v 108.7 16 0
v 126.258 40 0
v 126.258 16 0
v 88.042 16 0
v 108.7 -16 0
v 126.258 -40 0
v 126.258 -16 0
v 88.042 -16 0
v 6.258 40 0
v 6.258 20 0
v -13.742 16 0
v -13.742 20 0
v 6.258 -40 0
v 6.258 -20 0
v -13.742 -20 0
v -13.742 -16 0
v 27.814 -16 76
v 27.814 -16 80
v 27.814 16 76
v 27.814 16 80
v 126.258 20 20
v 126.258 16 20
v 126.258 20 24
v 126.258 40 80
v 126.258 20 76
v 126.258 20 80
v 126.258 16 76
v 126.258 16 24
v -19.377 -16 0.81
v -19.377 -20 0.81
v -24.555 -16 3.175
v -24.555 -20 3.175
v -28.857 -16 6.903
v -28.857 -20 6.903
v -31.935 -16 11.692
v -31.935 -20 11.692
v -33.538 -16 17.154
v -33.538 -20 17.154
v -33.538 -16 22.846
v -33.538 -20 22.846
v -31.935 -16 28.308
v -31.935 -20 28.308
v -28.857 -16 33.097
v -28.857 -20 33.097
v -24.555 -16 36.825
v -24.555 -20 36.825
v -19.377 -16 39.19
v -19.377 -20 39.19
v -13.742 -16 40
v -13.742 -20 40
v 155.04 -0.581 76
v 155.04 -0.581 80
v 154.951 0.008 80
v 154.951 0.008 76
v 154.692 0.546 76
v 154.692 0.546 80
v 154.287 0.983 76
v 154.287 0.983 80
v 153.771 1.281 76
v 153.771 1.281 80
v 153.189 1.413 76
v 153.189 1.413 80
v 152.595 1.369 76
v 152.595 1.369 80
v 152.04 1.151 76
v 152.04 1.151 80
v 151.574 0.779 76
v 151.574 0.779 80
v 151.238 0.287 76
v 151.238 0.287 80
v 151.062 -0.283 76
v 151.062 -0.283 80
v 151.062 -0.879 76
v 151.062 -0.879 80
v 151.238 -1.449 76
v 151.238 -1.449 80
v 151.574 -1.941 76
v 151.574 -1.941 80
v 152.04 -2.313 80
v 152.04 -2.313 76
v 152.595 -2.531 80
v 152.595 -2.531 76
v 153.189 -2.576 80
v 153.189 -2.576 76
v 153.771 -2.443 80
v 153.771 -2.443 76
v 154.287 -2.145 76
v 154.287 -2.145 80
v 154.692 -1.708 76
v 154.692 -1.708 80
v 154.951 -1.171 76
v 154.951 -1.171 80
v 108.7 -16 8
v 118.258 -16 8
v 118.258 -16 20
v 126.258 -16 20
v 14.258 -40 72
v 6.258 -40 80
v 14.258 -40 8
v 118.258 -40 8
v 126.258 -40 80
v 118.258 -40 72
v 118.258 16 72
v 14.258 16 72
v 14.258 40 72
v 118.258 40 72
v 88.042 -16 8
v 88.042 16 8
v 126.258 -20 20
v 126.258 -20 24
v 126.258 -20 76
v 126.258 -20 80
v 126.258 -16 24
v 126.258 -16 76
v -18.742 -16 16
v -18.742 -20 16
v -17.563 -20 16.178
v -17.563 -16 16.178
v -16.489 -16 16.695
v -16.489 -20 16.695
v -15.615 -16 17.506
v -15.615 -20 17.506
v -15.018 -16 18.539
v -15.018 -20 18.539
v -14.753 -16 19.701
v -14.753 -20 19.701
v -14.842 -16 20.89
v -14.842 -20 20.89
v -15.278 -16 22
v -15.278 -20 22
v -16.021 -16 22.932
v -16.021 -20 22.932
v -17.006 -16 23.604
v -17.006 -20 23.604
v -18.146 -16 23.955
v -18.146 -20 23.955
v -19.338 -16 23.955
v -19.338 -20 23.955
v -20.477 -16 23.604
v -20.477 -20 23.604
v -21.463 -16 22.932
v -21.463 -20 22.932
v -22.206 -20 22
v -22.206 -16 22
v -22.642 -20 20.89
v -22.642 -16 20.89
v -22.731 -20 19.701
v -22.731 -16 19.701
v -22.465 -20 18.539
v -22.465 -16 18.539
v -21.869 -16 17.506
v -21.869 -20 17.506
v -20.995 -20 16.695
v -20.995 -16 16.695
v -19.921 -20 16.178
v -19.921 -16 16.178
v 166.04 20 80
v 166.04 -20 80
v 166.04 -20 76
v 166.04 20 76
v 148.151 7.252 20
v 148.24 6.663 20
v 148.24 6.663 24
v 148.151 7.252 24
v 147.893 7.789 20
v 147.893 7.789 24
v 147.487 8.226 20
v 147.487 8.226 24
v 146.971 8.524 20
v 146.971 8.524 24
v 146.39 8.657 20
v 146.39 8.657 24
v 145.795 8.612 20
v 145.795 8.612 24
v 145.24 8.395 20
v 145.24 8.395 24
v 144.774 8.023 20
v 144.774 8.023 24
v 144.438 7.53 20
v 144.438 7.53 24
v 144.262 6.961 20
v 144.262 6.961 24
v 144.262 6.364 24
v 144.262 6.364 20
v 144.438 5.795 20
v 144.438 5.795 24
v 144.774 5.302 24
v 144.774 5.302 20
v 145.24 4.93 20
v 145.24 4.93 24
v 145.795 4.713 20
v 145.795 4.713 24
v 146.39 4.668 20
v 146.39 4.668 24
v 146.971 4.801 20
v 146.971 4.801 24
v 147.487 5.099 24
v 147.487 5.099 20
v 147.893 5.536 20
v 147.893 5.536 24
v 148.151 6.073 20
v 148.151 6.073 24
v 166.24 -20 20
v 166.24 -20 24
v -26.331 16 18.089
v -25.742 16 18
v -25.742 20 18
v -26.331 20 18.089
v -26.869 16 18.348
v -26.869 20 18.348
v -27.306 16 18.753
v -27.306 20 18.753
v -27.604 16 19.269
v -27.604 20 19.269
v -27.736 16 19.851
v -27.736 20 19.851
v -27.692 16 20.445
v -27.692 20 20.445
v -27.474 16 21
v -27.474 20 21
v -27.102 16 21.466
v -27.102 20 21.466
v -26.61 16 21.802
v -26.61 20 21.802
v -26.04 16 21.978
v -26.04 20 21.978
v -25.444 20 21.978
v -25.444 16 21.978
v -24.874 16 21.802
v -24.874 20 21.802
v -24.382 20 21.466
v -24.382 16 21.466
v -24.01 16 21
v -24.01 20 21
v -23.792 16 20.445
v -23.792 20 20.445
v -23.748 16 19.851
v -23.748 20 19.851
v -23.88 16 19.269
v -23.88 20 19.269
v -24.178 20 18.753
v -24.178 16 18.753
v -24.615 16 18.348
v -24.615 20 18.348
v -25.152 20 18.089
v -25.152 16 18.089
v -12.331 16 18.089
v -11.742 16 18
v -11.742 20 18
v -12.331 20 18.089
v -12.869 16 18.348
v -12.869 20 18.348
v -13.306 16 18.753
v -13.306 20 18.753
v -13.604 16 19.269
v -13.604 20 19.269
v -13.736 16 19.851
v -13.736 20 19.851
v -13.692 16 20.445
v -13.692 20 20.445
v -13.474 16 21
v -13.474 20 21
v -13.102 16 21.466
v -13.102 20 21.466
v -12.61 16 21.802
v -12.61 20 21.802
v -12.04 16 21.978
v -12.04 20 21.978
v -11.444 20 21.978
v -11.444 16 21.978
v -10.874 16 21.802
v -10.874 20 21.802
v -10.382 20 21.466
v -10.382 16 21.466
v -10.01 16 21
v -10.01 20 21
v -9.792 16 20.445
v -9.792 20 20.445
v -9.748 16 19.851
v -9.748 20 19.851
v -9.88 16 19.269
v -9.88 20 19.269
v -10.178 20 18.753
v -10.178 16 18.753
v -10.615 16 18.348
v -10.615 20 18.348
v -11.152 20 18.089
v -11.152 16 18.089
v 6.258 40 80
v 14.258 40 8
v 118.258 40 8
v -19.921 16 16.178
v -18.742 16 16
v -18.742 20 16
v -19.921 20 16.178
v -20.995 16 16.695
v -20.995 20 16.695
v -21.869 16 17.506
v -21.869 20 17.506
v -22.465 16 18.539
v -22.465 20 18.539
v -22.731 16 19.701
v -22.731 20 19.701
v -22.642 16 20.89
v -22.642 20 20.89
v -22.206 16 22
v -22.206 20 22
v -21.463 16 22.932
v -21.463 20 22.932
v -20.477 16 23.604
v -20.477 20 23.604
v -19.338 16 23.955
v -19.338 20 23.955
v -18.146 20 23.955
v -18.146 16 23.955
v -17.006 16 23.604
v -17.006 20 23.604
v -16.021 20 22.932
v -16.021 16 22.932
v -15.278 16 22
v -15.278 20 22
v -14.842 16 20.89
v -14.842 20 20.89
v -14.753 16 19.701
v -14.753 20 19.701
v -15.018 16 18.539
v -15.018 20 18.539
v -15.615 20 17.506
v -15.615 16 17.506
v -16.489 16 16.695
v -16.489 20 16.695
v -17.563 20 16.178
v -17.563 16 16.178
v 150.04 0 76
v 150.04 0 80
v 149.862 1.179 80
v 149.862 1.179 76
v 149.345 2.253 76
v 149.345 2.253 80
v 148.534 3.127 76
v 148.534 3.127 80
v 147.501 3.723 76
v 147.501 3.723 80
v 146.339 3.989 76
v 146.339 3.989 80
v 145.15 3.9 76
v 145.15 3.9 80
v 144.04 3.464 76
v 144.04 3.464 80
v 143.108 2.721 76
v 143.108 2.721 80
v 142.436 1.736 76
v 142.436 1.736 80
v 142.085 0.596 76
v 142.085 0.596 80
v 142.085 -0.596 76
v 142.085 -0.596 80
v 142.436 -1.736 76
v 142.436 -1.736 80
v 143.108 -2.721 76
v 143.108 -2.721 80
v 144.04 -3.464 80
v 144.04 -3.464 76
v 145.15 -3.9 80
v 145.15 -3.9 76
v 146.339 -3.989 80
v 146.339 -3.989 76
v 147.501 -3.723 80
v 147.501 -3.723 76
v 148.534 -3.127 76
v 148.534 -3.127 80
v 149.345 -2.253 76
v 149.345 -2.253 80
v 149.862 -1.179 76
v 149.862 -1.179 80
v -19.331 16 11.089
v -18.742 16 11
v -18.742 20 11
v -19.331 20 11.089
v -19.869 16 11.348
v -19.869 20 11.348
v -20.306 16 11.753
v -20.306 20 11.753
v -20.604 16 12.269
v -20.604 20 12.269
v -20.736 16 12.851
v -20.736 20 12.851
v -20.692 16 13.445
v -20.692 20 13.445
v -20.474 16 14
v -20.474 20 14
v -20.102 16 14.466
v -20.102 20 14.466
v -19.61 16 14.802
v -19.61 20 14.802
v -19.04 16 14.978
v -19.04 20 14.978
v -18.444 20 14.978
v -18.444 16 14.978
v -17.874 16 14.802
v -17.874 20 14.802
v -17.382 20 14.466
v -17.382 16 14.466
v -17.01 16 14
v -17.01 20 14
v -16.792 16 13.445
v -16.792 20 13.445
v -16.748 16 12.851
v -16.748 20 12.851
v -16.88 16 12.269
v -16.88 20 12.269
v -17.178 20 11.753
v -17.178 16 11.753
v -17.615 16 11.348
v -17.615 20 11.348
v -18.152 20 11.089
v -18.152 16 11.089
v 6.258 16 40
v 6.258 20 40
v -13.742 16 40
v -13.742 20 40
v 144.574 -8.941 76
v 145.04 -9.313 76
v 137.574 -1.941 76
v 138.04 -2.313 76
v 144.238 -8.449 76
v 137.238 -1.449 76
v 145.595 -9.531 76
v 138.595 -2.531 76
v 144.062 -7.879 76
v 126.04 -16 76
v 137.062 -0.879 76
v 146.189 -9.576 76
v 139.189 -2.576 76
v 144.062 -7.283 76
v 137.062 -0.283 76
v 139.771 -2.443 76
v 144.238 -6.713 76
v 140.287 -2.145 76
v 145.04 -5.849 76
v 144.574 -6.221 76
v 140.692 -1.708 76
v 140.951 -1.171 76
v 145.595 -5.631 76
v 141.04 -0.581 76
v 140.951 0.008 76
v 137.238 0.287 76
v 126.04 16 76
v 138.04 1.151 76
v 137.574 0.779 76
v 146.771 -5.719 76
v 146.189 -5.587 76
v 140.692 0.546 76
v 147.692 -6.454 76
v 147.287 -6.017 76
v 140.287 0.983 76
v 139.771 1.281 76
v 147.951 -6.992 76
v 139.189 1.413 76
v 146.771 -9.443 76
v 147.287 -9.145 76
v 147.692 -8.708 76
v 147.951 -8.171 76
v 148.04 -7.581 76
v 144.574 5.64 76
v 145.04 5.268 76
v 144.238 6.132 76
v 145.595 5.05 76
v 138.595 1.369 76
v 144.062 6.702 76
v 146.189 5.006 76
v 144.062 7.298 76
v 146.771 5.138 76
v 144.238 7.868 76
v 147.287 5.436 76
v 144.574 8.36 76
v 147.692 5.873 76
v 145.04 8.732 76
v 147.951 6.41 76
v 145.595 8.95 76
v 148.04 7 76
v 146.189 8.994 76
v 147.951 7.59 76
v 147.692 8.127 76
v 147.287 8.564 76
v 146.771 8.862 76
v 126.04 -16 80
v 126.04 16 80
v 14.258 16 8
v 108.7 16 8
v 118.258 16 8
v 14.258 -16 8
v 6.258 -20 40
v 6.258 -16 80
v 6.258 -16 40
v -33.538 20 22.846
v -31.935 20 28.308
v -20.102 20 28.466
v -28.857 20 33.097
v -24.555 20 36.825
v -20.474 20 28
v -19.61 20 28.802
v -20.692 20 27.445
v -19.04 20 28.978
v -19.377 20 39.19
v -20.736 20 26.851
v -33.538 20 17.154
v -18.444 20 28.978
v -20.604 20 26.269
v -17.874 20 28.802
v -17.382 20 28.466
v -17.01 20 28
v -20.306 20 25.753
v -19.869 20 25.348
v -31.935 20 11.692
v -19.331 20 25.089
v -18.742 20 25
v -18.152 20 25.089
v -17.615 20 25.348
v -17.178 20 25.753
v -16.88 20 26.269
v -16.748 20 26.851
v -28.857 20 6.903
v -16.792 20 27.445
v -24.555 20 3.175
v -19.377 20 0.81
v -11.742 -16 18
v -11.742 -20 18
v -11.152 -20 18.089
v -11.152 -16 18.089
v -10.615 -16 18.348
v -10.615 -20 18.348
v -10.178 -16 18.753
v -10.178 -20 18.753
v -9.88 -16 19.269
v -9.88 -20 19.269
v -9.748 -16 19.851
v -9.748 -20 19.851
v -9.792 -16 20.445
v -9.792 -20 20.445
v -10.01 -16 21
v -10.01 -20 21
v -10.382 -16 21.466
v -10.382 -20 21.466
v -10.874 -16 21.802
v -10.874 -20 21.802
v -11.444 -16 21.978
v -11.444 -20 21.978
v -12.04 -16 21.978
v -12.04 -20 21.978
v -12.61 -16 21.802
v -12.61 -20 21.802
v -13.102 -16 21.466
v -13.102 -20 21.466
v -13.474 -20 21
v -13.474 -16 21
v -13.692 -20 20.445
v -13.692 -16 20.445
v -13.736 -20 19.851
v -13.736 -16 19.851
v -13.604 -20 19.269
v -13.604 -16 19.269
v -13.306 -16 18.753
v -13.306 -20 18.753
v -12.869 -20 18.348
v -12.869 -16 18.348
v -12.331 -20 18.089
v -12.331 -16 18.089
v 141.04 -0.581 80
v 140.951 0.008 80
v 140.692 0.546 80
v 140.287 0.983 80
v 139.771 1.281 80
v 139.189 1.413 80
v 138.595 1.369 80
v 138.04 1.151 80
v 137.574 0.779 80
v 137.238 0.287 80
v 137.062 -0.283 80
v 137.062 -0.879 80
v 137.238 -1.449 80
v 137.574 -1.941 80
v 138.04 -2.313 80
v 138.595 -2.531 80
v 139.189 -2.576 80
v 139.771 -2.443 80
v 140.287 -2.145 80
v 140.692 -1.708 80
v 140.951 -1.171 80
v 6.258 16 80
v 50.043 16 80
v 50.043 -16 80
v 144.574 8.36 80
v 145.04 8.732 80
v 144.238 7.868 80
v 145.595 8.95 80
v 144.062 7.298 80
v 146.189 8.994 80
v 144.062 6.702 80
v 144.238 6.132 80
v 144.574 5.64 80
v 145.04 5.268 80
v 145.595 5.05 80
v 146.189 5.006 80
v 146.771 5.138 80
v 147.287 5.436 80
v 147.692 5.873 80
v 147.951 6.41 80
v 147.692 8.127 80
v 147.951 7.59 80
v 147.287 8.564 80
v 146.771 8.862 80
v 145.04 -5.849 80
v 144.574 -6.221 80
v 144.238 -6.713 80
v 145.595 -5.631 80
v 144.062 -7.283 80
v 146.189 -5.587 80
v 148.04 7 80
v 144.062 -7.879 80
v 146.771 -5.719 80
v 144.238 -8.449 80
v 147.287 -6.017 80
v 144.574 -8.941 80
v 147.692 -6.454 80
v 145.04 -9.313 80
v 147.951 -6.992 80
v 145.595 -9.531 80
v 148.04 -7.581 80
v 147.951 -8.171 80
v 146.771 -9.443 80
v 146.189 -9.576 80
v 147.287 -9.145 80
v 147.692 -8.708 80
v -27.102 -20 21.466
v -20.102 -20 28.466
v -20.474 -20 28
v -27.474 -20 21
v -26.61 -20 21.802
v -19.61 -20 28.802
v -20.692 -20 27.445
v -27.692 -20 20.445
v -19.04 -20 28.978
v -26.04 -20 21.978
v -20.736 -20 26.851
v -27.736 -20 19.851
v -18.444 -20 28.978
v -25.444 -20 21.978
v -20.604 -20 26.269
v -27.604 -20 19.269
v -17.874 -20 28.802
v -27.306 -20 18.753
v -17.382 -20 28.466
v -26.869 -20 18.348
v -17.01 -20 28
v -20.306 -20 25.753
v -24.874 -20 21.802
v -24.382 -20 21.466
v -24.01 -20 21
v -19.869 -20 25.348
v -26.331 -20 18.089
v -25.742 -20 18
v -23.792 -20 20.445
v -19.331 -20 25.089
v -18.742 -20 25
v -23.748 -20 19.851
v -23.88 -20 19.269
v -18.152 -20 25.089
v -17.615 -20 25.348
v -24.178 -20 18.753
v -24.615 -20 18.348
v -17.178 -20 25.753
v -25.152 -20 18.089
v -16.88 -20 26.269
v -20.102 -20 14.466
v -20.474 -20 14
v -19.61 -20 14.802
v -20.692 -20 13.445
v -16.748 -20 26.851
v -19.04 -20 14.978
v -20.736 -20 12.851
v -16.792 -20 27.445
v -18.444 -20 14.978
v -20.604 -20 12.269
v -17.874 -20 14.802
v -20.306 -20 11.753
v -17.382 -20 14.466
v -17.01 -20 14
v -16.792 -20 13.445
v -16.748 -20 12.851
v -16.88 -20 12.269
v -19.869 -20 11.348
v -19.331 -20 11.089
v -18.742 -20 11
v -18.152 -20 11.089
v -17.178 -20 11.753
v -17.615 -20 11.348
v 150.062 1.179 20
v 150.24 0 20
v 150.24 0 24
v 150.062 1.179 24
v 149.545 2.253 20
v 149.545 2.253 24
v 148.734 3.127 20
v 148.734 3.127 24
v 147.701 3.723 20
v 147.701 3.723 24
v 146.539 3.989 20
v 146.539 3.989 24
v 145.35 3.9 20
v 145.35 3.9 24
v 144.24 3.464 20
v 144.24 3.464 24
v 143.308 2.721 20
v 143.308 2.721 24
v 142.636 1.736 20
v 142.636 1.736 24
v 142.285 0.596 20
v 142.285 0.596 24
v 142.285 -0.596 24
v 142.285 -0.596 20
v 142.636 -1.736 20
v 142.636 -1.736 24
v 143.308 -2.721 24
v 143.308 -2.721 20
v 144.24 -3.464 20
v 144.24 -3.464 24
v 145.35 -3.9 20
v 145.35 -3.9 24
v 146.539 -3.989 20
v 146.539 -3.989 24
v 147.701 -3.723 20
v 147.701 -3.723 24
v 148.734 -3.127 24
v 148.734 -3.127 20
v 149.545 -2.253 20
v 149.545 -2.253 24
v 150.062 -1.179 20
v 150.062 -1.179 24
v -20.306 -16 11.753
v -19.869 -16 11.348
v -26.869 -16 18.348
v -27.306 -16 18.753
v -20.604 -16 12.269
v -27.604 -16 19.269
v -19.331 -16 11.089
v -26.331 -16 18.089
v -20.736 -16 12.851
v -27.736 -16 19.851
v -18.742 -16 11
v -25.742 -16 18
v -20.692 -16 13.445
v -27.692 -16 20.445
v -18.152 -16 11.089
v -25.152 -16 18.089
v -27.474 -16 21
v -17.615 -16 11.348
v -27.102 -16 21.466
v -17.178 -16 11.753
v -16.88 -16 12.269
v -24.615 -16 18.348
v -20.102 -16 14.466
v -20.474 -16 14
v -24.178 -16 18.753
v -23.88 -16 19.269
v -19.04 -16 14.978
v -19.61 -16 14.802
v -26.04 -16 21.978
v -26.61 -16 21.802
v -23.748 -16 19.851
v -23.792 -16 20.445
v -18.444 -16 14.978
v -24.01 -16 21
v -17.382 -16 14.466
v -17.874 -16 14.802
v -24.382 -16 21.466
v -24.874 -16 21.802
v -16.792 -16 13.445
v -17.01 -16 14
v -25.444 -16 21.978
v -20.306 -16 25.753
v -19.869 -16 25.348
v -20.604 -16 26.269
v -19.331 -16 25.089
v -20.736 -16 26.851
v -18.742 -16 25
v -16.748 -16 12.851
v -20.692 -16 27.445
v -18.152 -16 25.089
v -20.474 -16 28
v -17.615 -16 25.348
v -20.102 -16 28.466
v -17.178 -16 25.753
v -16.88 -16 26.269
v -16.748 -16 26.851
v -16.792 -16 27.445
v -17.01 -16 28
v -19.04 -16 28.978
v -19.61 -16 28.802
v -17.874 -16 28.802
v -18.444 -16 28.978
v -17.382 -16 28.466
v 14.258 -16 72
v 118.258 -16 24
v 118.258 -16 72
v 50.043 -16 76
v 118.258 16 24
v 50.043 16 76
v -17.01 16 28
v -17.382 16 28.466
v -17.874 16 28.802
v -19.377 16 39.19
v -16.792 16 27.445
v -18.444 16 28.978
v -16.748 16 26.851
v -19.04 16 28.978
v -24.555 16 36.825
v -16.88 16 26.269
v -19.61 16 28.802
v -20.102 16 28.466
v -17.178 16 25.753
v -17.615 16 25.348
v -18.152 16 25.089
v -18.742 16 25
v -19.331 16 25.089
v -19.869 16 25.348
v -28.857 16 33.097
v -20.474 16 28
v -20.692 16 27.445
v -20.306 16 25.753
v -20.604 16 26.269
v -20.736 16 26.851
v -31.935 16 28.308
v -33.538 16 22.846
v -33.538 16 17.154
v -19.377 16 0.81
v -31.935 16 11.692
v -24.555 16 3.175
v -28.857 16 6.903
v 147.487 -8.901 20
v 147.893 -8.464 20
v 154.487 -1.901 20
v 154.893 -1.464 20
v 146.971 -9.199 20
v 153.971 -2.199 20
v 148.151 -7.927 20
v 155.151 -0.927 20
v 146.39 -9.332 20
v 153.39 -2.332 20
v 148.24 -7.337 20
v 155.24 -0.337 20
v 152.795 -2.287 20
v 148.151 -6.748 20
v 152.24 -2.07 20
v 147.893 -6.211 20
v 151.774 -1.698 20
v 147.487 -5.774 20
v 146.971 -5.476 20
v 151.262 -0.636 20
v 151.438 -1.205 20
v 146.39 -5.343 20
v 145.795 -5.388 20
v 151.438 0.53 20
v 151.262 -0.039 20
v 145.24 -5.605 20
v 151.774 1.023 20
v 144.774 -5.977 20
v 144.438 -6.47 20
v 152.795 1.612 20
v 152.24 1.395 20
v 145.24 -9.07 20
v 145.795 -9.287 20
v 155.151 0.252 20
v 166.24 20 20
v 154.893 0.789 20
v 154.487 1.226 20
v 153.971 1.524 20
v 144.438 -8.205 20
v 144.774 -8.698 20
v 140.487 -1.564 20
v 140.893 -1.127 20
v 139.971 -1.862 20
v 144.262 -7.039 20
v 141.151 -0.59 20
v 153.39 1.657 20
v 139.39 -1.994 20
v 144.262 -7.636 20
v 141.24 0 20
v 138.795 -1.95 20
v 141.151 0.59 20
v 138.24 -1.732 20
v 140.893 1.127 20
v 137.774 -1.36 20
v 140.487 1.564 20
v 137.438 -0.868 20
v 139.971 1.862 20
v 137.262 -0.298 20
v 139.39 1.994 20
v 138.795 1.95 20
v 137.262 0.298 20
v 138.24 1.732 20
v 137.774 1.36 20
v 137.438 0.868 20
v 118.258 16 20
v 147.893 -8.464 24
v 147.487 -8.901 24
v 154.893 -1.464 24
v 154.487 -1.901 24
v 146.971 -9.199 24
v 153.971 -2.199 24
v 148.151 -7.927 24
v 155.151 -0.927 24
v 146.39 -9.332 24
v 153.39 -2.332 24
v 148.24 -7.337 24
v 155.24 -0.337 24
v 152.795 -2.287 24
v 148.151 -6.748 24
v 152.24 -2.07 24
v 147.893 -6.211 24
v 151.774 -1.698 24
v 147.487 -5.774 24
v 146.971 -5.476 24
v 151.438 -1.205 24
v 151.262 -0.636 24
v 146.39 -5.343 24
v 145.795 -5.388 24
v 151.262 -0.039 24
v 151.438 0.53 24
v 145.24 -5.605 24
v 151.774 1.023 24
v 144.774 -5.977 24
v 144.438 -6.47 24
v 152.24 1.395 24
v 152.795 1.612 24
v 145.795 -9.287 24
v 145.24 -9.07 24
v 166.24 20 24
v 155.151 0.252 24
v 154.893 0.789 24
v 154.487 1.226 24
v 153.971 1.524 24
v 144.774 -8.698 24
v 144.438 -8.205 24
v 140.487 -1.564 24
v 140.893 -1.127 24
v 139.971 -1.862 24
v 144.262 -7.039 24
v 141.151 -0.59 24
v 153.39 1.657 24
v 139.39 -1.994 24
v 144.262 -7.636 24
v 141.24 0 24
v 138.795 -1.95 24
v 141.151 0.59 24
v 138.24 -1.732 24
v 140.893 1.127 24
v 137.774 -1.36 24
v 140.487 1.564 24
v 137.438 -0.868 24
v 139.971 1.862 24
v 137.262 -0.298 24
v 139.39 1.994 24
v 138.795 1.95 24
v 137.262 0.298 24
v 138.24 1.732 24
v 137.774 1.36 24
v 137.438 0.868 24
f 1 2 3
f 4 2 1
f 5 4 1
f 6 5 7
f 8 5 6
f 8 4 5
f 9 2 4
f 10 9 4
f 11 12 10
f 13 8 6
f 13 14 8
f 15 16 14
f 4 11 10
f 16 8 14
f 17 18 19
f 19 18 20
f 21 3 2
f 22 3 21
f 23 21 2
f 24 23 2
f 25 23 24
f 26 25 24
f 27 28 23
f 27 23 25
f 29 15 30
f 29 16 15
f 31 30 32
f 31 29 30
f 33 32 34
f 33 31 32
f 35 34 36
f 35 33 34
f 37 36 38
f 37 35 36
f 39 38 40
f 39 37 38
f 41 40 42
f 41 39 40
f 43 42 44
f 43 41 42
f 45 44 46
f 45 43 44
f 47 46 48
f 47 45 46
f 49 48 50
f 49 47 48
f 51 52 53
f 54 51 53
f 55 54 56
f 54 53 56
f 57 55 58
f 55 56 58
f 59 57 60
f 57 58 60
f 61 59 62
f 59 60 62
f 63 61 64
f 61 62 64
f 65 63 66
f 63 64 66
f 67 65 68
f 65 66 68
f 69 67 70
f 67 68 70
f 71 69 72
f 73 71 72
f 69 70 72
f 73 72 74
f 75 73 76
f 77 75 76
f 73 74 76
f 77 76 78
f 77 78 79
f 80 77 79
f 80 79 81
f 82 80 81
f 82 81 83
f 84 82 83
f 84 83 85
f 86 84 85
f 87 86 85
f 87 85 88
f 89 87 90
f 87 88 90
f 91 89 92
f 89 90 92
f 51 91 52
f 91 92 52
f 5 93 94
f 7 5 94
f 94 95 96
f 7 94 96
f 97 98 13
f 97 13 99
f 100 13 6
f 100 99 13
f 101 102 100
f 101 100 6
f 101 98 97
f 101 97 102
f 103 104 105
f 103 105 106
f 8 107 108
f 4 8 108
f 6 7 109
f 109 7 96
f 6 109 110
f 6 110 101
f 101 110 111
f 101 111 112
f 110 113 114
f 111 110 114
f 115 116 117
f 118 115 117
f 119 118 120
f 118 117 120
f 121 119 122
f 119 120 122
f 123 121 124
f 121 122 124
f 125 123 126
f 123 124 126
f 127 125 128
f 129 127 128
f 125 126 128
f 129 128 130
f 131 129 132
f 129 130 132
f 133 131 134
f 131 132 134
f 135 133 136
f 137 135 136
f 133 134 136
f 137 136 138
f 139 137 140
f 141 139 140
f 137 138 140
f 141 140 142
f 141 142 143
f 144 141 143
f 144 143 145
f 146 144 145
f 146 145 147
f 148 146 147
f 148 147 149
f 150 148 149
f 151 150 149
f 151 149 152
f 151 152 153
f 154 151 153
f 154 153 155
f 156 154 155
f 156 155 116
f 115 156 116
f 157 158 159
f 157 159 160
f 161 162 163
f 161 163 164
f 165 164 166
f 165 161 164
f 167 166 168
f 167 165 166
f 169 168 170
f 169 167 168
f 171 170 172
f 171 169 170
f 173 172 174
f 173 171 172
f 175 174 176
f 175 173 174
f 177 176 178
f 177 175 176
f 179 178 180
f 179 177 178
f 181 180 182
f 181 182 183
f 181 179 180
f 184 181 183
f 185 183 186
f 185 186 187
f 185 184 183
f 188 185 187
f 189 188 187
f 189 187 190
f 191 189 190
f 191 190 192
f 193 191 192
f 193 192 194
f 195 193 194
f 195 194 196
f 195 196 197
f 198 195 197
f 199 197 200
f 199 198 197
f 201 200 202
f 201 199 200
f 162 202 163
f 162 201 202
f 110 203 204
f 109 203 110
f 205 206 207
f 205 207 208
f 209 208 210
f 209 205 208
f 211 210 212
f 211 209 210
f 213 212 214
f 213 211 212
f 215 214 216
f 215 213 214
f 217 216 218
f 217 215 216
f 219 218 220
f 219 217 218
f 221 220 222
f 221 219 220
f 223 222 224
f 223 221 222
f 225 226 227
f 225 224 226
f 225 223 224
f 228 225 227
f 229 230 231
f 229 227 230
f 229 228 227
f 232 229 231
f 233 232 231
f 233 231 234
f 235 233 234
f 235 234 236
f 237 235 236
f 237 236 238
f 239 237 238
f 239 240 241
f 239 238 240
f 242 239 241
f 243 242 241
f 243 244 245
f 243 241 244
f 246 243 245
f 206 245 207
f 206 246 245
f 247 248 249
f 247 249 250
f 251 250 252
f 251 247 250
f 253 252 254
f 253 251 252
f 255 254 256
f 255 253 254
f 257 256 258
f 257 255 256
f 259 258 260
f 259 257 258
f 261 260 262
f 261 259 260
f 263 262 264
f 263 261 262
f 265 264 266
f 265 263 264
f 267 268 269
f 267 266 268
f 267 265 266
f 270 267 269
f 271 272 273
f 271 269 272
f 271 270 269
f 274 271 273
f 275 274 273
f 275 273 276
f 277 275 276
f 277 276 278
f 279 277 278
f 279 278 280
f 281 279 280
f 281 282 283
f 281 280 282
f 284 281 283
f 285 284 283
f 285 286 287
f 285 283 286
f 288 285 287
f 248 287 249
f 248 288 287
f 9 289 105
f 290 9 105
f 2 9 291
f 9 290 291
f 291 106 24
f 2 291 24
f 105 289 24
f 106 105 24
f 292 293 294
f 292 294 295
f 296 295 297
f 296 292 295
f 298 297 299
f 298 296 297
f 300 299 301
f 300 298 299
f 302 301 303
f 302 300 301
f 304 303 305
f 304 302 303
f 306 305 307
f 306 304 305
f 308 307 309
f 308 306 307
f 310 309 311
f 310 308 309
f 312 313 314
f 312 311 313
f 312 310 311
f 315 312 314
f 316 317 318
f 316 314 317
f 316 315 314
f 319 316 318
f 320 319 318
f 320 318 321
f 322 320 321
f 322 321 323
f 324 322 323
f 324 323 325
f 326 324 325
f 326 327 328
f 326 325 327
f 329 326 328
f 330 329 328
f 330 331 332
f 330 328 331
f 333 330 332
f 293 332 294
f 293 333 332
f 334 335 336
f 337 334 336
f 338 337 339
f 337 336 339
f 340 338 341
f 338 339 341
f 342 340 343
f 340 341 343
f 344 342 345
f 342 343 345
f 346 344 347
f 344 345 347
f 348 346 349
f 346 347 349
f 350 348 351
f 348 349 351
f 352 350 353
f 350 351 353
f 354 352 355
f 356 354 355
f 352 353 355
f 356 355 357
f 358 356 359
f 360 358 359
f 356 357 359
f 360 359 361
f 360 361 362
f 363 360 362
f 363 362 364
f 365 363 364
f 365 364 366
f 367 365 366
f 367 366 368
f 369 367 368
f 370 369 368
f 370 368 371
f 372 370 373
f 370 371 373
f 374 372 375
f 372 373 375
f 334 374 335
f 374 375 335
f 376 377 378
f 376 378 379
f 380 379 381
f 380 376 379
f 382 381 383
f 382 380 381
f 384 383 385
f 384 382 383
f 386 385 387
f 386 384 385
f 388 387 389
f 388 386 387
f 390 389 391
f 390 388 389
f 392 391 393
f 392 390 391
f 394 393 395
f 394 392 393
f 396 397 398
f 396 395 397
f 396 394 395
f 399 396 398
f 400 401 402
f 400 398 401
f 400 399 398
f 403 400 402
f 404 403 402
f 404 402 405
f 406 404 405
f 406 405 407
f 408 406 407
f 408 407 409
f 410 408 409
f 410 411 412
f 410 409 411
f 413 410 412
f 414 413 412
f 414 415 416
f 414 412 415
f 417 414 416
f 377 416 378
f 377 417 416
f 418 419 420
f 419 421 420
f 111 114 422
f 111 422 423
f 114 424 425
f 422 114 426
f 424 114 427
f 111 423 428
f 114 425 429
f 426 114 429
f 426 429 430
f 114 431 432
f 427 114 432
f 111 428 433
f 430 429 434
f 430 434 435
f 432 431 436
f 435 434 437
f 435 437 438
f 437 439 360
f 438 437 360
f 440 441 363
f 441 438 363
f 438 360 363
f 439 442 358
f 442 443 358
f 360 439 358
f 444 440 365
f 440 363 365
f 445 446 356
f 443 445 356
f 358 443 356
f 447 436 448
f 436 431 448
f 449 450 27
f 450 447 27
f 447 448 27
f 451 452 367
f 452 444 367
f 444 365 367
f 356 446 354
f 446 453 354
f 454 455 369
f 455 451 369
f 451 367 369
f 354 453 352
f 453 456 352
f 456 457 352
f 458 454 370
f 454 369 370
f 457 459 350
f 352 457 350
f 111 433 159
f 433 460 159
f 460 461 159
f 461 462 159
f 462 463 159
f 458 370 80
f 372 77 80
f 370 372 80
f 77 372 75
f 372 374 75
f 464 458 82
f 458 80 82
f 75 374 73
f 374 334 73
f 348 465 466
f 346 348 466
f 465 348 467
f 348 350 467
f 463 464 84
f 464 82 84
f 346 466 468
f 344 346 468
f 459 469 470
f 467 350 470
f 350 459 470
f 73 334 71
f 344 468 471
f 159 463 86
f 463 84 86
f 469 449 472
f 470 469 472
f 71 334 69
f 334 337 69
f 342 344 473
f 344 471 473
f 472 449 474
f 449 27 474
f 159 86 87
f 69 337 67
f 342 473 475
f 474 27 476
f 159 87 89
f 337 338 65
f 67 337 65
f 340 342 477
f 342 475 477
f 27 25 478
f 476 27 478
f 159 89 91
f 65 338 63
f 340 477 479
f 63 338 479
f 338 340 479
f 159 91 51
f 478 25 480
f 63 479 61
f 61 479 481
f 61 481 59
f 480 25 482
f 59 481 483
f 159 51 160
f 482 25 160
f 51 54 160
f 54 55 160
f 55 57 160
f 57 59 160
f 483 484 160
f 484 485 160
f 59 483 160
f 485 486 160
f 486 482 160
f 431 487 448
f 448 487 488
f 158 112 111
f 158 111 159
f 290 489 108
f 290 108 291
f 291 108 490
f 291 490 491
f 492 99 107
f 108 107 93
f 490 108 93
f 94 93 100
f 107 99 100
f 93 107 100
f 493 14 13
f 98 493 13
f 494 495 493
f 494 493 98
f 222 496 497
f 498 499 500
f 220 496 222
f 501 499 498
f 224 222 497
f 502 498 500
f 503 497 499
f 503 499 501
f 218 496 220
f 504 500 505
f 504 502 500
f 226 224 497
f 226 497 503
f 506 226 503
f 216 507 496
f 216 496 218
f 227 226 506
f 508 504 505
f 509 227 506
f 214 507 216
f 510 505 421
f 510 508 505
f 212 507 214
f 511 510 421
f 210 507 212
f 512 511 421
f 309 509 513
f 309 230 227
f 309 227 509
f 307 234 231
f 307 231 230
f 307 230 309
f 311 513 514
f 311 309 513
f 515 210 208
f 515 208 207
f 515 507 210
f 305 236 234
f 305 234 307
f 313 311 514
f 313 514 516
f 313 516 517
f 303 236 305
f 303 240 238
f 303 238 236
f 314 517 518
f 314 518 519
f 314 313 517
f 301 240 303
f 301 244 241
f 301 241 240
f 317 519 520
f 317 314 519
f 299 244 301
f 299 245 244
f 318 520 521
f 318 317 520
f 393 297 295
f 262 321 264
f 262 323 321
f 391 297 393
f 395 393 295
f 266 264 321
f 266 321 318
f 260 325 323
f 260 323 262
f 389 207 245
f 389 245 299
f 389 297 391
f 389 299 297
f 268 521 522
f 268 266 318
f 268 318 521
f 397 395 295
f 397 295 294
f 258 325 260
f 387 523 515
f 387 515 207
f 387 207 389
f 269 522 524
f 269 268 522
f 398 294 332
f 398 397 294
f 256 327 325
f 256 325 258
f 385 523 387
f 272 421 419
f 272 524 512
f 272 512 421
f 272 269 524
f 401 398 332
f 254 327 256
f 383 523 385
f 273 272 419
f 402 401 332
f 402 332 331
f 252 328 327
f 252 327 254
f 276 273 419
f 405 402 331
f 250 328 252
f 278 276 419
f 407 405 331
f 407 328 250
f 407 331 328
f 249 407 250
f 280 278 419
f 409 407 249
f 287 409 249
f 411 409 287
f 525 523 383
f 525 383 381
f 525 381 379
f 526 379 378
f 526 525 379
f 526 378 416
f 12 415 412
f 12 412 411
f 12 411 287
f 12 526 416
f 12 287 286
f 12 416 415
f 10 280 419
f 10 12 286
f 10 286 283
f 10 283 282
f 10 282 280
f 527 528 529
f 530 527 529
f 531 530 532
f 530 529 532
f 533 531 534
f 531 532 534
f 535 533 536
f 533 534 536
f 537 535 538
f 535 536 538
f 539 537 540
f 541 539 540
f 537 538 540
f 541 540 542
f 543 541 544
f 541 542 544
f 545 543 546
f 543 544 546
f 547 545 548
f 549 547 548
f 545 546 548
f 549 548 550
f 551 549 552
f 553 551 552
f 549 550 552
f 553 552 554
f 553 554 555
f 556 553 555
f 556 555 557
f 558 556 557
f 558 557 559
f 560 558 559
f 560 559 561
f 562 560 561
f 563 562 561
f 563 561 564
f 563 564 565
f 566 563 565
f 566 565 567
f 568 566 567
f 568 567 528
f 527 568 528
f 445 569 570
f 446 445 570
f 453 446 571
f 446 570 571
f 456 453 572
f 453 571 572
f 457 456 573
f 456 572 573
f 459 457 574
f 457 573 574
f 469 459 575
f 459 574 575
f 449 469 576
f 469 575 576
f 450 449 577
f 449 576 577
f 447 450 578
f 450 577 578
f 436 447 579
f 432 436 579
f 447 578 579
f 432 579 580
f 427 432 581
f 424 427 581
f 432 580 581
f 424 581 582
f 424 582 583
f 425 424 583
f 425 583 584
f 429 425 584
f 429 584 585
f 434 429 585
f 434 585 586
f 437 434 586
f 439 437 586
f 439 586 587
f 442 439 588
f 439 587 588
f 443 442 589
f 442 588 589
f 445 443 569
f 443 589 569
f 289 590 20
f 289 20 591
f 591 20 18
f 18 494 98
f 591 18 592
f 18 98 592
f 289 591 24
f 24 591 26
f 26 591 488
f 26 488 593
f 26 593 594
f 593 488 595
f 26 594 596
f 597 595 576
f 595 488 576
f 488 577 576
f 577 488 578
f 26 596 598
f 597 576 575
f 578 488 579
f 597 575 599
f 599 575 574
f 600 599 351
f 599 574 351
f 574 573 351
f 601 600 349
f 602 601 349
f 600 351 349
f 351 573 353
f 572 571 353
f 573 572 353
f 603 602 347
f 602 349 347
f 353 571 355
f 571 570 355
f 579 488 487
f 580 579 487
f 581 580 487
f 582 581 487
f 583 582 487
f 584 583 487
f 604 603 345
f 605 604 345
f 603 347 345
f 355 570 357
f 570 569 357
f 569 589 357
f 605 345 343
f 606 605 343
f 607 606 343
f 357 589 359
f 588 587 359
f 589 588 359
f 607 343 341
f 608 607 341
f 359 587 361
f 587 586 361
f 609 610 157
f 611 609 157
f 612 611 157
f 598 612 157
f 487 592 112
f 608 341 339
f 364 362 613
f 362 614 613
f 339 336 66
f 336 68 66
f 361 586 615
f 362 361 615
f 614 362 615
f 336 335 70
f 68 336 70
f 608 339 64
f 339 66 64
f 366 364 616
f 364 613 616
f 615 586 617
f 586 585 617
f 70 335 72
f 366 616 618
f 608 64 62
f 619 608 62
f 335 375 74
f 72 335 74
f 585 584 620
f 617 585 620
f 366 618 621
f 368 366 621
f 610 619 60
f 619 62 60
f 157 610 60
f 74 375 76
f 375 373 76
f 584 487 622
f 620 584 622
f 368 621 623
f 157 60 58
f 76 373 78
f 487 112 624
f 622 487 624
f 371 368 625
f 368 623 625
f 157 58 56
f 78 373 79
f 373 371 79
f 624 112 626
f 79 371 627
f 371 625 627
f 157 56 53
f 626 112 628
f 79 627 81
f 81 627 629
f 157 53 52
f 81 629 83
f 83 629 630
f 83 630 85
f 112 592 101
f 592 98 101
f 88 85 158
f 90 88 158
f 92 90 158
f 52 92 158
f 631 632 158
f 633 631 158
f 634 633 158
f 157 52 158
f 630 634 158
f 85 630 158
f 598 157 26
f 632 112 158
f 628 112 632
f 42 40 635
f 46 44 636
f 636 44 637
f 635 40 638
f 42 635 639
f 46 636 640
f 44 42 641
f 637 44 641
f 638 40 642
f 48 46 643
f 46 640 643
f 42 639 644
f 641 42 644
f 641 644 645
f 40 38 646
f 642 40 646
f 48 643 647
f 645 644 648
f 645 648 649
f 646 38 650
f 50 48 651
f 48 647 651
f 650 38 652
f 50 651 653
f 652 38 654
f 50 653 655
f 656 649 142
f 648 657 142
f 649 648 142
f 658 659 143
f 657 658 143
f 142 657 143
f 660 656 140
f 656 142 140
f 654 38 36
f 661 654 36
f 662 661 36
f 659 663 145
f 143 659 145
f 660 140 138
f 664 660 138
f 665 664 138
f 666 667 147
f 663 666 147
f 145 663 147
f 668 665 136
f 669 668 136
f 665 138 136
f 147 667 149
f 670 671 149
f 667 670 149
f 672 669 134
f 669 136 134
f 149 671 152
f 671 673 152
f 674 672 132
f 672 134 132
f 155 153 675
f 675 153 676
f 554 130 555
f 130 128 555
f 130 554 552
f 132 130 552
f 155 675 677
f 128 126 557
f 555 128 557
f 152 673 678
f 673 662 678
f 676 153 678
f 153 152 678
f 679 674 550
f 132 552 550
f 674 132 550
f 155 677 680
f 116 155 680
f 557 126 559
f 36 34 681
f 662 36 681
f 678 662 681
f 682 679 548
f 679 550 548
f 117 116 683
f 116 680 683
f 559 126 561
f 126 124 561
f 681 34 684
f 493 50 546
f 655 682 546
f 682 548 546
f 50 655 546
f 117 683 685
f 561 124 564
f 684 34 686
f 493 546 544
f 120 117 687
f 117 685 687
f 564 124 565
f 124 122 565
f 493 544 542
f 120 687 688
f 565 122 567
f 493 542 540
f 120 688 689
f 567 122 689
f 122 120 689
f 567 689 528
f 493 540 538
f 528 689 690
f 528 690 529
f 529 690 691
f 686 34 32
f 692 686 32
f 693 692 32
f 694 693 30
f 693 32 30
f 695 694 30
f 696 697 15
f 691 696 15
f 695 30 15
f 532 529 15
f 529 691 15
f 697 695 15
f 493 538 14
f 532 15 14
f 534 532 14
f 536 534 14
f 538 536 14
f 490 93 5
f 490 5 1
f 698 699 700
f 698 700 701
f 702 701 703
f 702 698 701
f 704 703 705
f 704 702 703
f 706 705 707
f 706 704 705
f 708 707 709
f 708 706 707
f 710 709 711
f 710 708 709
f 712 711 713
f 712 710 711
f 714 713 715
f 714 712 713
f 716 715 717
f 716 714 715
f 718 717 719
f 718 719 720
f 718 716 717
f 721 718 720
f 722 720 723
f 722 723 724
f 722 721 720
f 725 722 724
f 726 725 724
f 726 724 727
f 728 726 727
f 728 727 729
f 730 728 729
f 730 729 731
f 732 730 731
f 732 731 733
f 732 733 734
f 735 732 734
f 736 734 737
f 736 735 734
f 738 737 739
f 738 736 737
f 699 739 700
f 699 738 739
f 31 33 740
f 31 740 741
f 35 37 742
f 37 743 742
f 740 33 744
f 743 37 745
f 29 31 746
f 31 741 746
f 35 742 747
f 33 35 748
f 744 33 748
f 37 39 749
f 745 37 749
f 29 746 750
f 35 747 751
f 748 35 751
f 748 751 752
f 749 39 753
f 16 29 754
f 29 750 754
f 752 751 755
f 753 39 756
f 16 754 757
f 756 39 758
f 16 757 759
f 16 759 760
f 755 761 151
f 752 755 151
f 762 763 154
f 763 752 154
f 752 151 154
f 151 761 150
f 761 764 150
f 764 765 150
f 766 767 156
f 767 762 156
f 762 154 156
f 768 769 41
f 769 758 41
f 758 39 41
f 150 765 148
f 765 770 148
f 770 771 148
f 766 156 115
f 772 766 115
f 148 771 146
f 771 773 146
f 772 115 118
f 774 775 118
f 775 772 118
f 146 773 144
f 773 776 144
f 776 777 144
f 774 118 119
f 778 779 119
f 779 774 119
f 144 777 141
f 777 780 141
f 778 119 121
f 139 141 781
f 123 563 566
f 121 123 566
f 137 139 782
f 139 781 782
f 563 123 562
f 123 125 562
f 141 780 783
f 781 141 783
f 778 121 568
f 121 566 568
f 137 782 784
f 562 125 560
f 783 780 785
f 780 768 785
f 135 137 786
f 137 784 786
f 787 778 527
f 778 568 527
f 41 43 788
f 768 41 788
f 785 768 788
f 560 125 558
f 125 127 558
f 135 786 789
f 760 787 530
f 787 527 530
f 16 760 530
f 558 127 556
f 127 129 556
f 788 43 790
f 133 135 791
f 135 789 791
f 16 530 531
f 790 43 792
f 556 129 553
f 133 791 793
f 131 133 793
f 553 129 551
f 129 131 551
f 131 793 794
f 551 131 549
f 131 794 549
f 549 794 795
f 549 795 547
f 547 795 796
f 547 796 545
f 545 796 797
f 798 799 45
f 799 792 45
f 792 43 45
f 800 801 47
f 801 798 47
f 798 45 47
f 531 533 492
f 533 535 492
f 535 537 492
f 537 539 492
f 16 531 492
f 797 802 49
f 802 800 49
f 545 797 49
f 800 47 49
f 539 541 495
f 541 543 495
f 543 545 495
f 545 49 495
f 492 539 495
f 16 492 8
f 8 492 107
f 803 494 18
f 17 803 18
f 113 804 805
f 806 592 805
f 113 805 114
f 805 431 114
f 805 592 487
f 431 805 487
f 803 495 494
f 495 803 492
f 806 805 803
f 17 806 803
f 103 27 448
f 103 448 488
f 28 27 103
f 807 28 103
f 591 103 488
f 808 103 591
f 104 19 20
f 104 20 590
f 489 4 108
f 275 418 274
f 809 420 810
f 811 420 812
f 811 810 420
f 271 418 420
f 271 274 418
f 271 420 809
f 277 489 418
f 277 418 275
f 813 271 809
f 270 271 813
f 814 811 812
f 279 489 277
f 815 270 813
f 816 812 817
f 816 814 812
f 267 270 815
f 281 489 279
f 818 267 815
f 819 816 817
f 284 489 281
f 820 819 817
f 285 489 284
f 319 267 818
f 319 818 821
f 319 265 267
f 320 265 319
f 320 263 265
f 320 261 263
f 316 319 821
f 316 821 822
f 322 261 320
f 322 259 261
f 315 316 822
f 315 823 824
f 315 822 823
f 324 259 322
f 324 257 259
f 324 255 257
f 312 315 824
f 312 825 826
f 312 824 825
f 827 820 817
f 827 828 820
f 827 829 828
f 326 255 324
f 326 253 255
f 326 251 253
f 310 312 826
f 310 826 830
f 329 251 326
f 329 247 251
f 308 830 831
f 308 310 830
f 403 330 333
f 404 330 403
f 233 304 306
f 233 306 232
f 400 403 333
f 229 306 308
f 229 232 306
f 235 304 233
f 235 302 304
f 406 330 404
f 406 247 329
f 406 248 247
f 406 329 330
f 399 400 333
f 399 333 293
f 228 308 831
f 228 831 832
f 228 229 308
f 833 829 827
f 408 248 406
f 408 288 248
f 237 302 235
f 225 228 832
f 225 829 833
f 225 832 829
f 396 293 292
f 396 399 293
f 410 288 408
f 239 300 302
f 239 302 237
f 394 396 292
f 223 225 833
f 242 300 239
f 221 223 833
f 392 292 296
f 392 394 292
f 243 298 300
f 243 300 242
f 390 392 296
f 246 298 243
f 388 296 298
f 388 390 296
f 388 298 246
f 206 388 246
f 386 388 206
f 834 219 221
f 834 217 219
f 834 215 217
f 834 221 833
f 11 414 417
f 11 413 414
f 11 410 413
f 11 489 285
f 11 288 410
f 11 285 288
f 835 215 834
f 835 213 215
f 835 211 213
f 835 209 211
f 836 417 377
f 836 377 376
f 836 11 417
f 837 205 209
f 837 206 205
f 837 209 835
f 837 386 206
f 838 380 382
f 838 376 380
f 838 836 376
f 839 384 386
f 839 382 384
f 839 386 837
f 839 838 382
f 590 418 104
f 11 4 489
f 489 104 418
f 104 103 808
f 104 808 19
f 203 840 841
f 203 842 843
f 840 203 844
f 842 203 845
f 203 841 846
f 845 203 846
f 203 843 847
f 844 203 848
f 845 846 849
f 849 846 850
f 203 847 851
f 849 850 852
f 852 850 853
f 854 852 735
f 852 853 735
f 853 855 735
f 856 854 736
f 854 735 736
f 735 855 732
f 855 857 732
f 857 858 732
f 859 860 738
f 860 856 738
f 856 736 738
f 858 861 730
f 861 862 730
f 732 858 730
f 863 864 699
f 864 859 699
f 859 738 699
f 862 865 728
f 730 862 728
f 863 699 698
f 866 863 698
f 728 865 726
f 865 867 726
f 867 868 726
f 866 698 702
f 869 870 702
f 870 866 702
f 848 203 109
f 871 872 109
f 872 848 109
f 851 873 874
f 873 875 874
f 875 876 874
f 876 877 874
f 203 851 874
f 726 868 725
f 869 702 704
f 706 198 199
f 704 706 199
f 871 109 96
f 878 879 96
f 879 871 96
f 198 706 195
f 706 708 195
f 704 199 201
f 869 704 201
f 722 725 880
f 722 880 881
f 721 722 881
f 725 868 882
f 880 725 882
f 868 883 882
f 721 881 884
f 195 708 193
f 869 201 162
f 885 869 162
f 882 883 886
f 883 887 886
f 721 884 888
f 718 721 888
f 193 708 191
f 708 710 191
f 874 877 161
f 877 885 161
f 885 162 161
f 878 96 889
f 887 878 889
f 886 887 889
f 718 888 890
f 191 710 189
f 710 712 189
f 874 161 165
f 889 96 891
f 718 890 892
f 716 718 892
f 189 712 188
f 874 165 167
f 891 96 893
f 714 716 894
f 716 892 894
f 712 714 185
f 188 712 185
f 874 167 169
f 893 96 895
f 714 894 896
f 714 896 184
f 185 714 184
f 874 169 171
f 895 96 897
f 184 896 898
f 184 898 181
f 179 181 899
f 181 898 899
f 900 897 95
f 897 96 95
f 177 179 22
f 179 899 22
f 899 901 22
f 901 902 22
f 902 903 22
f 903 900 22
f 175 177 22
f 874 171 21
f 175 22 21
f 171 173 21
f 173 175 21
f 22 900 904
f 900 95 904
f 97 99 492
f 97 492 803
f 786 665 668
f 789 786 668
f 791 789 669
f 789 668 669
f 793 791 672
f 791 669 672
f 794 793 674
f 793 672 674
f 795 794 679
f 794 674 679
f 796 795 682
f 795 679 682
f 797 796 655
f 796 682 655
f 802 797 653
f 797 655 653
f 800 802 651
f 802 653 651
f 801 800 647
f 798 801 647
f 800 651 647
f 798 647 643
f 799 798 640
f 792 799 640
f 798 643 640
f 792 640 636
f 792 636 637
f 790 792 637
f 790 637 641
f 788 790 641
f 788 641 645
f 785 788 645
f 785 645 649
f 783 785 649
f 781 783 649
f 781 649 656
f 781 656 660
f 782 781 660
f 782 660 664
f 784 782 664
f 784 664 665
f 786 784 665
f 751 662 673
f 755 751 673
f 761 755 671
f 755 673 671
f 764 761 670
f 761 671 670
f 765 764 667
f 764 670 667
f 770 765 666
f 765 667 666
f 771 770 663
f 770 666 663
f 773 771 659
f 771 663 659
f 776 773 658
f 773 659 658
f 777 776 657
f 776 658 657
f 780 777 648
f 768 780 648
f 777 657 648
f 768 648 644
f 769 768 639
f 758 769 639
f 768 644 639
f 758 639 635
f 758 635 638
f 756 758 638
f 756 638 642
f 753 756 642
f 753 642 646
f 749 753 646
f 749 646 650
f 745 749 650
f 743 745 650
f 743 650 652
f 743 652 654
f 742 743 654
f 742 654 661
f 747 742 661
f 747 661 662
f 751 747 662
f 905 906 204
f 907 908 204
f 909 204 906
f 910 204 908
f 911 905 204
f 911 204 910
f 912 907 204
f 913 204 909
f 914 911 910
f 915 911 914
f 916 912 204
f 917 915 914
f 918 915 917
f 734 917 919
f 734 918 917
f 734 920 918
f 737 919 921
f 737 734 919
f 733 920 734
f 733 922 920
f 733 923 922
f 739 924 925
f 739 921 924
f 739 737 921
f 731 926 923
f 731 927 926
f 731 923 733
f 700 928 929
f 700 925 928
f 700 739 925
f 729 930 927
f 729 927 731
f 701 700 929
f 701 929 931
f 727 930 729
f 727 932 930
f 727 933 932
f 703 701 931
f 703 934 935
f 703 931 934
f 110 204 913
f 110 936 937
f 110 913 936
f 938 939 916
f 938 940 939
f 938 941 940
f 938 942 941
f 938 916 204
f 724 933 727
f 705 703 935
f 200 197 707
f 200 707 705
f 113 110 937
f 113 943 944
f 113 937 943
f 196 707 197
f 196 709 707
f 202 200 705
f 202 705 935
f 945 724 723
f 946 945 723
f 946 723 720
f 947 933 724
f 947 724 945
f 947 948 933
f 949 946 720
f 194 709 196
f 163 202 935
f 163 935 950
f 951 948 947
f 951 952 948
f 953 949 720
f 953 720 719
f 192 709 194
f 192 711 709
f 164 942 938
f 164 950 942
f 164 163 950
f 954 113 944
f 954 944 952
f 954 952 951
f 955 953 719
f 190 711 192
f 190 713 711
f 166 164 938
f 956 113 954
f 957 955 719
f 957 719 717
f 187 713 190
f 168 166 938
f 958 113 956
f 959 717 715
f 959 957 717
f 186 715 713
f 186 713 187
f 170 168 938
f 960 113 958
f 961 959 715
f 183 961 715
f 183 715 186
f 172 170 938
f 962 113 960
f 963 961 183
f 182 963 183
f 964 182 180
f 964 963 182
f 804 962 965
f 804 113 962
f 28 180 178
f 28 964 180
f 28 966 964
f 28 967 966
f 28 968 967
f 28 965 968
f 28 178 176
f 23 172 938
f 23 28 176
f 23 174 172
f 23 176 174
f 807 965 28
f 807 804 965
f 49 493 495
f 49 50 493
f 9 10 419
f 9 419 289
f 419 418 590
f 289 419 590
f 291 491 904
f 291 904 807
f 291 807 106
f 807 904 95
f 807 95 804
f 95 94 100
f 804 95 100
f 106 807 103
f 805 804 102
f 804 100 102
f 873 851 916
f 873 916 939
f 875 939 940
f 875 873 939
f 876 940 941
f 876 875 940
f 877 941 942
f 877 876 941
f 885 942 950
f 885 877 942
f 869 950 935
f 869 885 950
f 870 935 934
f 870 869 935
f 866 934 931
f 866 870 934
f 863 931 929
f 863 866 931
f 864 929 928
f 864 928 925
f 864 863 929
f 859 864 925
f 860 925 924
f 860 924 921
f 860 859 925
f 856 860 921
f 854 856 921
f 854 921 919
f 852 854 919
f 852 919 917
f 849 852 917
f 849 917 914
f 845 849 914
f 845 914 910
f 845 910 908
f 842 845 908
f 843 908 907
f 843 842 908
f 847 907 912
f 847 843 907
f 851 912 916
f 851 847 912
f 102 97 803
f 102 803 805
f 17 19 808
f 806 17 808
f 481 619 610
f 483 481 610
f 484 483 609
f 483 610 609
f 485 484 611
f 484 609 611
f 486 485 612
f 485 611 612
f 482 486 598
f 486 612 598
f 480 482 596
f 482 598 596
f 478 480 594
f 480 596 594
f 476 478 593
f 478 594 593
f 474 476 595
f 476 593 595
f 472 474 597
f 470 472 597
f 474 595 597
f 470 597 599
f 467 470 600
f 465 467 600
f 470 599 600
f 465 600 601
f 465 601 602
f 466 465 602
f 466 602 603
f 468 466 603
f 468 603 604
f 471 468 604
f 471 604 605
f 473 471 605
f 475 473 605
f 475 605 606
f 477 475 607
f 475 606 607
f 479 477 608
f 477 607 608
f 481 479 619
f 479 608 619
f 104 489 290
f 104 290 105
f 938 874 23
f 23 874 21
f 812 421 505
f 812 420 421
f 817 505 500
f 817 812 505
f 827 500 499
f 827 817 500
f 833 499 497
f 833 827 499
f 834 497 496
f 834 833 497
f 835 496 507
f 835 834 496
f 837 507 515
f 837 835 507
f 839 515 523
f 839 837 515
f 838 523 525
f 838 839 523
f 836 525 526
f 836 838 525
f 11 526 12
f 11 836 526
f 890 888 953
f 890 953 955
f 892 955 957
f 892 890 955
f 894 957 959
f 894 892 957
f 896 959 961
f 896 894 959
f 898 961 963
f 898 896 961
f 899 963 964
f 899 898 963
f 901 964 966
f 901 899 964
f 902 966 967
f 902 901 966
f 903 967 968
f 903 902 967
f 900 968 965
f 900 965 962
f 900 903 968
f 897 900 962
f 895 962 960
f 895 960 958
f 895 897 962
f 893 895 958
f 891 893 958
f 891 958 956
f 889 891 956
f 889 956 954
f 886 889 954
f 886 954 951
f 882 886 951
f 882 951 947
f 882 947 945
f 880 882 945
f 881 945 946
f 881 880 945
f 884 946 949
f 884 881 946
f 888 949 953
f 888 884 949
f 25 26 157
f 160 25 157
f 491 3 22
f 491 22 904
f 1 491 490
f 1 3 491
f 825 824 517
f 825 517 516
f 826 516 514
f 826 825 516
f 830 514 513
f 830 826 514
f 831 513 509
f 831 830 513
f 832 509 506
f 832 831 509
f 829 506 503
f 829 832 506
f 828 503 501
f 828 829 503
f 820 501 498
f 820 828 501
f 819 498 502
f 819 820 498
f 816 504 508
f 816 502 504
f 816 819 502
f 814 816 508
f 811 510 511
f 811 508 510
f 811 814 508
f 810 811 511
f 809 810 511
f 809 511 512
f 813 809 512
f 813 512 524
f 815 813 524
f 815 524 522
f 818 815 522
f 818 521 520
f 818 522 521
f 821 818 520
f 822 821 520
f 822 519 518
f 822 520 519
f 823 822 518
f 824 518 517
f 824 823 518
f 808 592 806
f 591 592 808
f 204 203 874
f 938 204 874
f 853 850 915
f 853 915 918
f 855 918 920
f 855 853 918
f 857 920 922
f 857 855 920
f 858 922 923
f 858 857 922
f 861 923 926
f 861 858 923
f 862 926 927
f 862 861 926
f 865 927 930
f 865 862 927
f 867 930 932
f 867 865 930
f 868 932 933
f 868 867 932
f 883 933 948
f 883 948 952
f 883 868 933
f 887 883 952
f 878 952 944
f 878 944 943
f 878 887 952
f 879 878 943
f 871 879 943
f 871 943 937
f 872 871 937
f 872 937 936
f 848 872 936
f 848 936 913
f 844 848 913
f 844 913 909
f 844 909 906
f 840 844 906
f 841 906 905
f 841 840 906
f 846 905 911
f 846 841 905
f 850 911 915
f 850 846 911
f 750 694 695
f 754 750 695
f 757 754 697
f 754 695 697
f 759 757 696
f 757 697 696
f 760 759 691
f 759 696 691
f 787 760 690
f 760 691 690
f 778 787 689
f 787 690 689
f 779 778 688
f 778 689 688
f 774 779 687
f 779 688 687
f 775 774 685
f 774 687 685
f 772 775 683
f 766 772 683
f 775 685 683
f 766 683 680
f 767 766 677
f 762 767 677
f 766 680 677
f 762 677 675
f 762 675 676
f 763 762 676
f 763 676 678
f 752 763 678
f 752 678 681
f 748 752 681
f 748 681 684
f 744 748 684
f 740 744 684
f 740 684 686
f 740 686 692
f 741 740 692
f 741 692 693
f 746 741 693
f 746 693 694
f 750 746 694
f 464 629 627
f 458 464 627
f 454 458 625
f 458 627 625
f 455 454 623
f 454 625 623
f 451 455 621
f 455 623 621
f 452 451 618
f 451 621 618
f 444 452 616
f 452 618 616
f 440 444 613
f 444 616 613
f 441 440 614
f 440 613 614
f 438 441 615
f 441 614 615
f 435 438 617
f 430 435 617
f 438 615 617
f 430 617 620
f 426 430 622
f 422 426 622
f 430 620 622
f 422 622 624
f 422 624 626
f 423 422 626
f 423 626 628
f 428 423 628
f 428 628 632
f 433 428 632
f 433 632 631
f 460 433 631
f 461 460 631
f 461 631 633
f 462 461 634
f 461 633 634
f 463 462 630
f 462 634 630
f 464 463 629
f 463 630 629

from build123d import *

# Parameters (mm, degrees)
SALIENTE_EXTRUIR1_DEPTH = 40
SKETCH2_R               = 4
SKETCH2_R_2             = 2
CUT_EXTRUDE1_DEPTH      = 50
FILLET3_RADIUS          = 20
FILLET3_LENGTH          = 4
CROQUIS3_W              = 40
CROQUIS3_H              = 40
CROQUIS3_R              = 4
CROQUIS3_R_2            = 2
SALIENTE_EXTRUIR2_DEPTH = 4
SALIENTE_EXTRUIR3_START = -4
SKETCH7_W               = 120
SKETCH7_H               = 80
SALIENTE_EXTRUIR3_DEPTH = 24
CROQUIS4_W              = 40
CROQUIS4_H              = 40
CROQUIS4_R              = 4
CROQUIS4_R_2            = 2
SALIENTE_EXTRUIR4_DEPTH = 4
REDONDEO2_RADIUS        = 20
REDONDEO2_LENGTH        = 4
CROQUIS5_R              = 4
CROQUIS5_R_2            = 2
CORTAR_EXTRUIR1_DEPTH   = 50
CROQUIS6_W              = 22.229294361
CROQUIS6_H              = 60
SALIENTE_EXTRUIR5_DEPTH = 4
CROQUIS8_W              = 104
CROQUIS8_H              = 64
CORTAR_EXTRUIR2_DEPTH   = 80
CROQUIS7_W              = 13.68118259
CROQUIS7_H              = 40
SALIENTE_EXTRUIR6_DEPTH = 4
CROQUIS10_W             = 20.658327355
CROQUIS10_H             = 32
SALIENTE_EXTRUIR7_DEPTH = 8


with BuildPart() as part:
    # Croquis2 → Saliente-Extruir1 (new body)
    with BuildSketch(Plane(origin=(0, 0, 0), x_dir=(0, 1, 0), z_dir=(0, 0, 1))):
        Polygon((-16, -6.258064516), (-16, -4.258064516), (-16, 33.741935484), (-20, 33.741935484), (-20, -6.258064516), align=None)
    saliente_extruir1 = extrude(amount=SALIENTE_EXTRUIR1_DEPTH)

    # Sketch2 → Cut-Extrude1 (cut)
    with BuildSketch(Plane.XZ.offset(20)):
        with Locations(Location((-18.741935484, 20, 0), (0, 0, 270))):
            Circle(SKETCH2_R)
        with Locations(Location((-18.741935484, 27, 0), (0, 0, 270))):
            Circle(SKETCH2_R_2)
        with Locations(Location((-11.741935484, 20, 0), (0, 0, 270))):
            Circle(SKETCH2_R_2)
        with Locations(Location((-18.741935484, 13, 0), (0, 0, 270))):
            Circle(SKETCH2_R_2)
        with Locations(Location((-25.741935484, 20, 0), (0, 0, 270))):
            Circle(SKETCH2_R_2)
    extrude(amount=-CUT_EXTRUDE1_DEPTH, mode=Mode.SUBTRACT)

    # Fillet3: full round fillet: the end face becomes a half cylinder, R = half its width
    fillet3_face = Plane((-33.741935484, -18, 20), x_dir=(0, 1, 0), z_dir=(-1, 0, 0))  # on the end face: x along it, z out of the body
    fillet3_slab = fillet3_face.offset(-FILLET3_RADIUS / 2) * Box(FILLET3_LENGTH, 2 * FILLET3_RADIUS, FILLET3_RADIUS, mode=Mode.PRIVATE)  # the body's end, R deep
    fillet3_round = Plane((-13.741935484, -18, 20), x_dir=(-1, 0, 0), z_dir=(0, 1, 0)) * Cylinder(FILLET3_RADIUS, FILLET3_LENGTH, mode=Mode.PRIVATE)  # its axis R under the face
    add(fillet3_slab - fillet3_round, mode=Mode.SUBTRACT)



with BuildPart() as body_2:
    # Croquis3 → Saliente-Extruir2 (new body)
    with BuildSketch(Plane(origin=(0, 0, 20), x_dir=(0, 1, 0), z_dir=(0, 0, 1))):
        with Locations((0, -146.24009387)):
            Rectangle(CROQUIS3_W, CROQUIS3_H)
        with Locations(Location((0, -146.24009387, 0), (0, 0, 270))):
            Circle(CROQUIS3_R, mode=Mode.SUBTRACT)
        with Locations(Location((0, -139.24009387, 0), (0, 0, 270))):
            Circle(CROQUIS3_R_2, mode=Mode.SUBTRACT)
        with Locations(Location((6.662523083, -146.24009387, 0), (0, 0, 270))):
            Circle(CROQUIS3_R_2, mode=Mode.SUBTRACT)
        with Locations(Location((-0.337476917, -153.24009387, 0), (0, 0, 270))):
            Circle(CROQUIS3_R_2, mode=Mode.SUBTRACT)
        with Locations(Location((-7.337476917, -146.24009387, 0), (0, 0, 270))):
            Circle(CROQUIS3_R_2, mode=Mode.SUBTRACT)
    extrude(amount=SALIENTE_EXTRUIR2_DEPTH)


with BuildPart() as part_1:
    add(part.part)

    add(body_2.part)  # Saliente-Extruir3 merges body 2
    # Sketch7 → Saliente-Extruir3 (add)
    with BuildSketch(Plane.XZ.offset(20).offset(SALIENTE_EXTRUIR3_START)):
        with Locations((66.258064516, 40)):
            Rectangle(SKETCH7_W, SKETCH7_H)
    saliente_extruir3 = extrude(amount=SALIENTE_EXTRUIR3_DEPTH)

    # Croquis4 → Saliente-Extruir4 (add)
    with BuildSketch(Plane.XY.offset(80)):
        with Locations((146.039860125, 0)):
            Rectangle(CROQUIS4_W, CROQUIS4_H)
        with Locations((146.039860125, 0)):
            Circle(CROQUIS4_R, mode=Mode.SUBTRACT)
        with Locations((146.039860125, 7)):
            Circle(CROQUIS4_R_2, mode=Mode.SUBTRACT)
        with Locations((153.039860125, -0.581130473)):
            Circle(CROQUIS4_R_2, mode=Mode.SUBTRACT)
        with Locations((146.039860125, -7.581130473)):
            Circle(CROQUIS4_R_2, mode=Mode.SUBTRACT)
        with Locations((139.039860125, -0.581130473)):
            Circle(CROQUIS4_R_2, mode=Mode.SUBTRACT)
    extrude(amount=-SALIENTE_EXTRUIR4_DEPTH)

    # Simetría3: Saliente-Extruir3 across plane
    add(saliente_extruir3.mirror(Plane.ZX))

    # Simetría4: Saliente-Extruir1 across plane
    add(saliente_extruir1.mirror(Plane.ZX))

    # Redondeo2: full round fillet: the end face becomes a half cylinder, R = half its width
    redondeo2_face = Plane((-33.741935484, 18, 20), x_dir=(0, -1, 0), z_dir=(-1, 0, 0))  # on the end face: x along it, z out of the body
    redondeo2_slab = redondeo2_face.offset(-REDONDEO2_RADIUS / 2) * Box(REDONDEO2_LENGTH, 2 * REDONDEO2_RADIUS, REDONDEO2_RADIUS, mode=Mode.PRIVATE)  # the body's end, R deep
    redondeo2_round = Plane((-13.741935484, 18, 20), x_dir=(-1, 0, 0), z_dir=(0, -1, 0)) * Cylinder(REDONDEO2_RADIUS, REDONDEO2_LENGTH, mode=Mode.PRIVATE)  # its axis R under the face
    add(redondeo2_slab - redondeo2_round, mode=Mode.SUBTRACT)

    # Croquis5 → Cortar-Extruir1 (cut)
    with BuildSketch(Plane(origin=(0, 0, 0), x_dir=(-1, 0, 0), z_dir=(0, 1, 0))):
        with Locations(Location((18.741935484, 20, 0), (0, 0, 270))):
            Circle(CROQUIS5_R)
        with Locations(Location((18.741935484, 27, 0), (0, 0, 270))):
            Circle(CROQUIS5_R_2)
        with Locations(Location((25.741935484, 20, 0), (0, 0, 270))):
            Circle(CROQUIS5_R_2)
        with Locations(Location((18.741935484, 13, 0), (0, 0, 270))):
            Circle(CROQUIS5_R_2)
        with Locations(Location((11.741935484, 20, 0), (0, 0, 270))):
            Circle(CROQUIS5_R_2)
    extrude(amount=CORTAR_EXTRUIR1_DEPTH, mode=Mode.SUBTRACT)

    # Croquis6 → Saliente-Extruir5 (add)
    with BuildSketch(Plane.XY.offset(80)):
        with Locations((38.92855935, -10)):
            Rectangle(CROQUIS6_W, CROQUIS6_H)
    extrude(amount=-SALIENTE_EXTRUIR5_DEPTH)

    # Croquis8 → Cortar-Extruir2 (cut)
    with BuildSketch(Plane.XZ.offset(40)):
        with Locations((66.258064516, 40)):
            Rectangle(CROQUIS8_W, CROQUIS8_H)
    extrude(amount=-CORTAR_EXTRUIR2_DEPTH, mode=Mode.SUBTRACT)

    # Croquis7 → Saliente-Extruir6 (add)
    with BuildSketch(Plane(origin=(0, 0, 20), x_dir=(1, 0, 0), z_dir=(0, 0, -1))):
        with Locations((125.098655811, 0)):
            Rectangle(CROQUIS7_W, CROQUIS7_H)
    extrude(amount=-SALIENTE_EXTRUIR6_DEPTH)

    # Croquis10 → Saliente-Extruir7 (add)
    with BuildSketch(Plane.XY.offset(8)):
        with Locations((98.370697006, 0)):
            Rectangle(CROQUIS10_W, CROQUIS10_H)
    extrude(amount=-SALIENTE_EXTRUIR7_DEPTH)


solid = part_1.part
